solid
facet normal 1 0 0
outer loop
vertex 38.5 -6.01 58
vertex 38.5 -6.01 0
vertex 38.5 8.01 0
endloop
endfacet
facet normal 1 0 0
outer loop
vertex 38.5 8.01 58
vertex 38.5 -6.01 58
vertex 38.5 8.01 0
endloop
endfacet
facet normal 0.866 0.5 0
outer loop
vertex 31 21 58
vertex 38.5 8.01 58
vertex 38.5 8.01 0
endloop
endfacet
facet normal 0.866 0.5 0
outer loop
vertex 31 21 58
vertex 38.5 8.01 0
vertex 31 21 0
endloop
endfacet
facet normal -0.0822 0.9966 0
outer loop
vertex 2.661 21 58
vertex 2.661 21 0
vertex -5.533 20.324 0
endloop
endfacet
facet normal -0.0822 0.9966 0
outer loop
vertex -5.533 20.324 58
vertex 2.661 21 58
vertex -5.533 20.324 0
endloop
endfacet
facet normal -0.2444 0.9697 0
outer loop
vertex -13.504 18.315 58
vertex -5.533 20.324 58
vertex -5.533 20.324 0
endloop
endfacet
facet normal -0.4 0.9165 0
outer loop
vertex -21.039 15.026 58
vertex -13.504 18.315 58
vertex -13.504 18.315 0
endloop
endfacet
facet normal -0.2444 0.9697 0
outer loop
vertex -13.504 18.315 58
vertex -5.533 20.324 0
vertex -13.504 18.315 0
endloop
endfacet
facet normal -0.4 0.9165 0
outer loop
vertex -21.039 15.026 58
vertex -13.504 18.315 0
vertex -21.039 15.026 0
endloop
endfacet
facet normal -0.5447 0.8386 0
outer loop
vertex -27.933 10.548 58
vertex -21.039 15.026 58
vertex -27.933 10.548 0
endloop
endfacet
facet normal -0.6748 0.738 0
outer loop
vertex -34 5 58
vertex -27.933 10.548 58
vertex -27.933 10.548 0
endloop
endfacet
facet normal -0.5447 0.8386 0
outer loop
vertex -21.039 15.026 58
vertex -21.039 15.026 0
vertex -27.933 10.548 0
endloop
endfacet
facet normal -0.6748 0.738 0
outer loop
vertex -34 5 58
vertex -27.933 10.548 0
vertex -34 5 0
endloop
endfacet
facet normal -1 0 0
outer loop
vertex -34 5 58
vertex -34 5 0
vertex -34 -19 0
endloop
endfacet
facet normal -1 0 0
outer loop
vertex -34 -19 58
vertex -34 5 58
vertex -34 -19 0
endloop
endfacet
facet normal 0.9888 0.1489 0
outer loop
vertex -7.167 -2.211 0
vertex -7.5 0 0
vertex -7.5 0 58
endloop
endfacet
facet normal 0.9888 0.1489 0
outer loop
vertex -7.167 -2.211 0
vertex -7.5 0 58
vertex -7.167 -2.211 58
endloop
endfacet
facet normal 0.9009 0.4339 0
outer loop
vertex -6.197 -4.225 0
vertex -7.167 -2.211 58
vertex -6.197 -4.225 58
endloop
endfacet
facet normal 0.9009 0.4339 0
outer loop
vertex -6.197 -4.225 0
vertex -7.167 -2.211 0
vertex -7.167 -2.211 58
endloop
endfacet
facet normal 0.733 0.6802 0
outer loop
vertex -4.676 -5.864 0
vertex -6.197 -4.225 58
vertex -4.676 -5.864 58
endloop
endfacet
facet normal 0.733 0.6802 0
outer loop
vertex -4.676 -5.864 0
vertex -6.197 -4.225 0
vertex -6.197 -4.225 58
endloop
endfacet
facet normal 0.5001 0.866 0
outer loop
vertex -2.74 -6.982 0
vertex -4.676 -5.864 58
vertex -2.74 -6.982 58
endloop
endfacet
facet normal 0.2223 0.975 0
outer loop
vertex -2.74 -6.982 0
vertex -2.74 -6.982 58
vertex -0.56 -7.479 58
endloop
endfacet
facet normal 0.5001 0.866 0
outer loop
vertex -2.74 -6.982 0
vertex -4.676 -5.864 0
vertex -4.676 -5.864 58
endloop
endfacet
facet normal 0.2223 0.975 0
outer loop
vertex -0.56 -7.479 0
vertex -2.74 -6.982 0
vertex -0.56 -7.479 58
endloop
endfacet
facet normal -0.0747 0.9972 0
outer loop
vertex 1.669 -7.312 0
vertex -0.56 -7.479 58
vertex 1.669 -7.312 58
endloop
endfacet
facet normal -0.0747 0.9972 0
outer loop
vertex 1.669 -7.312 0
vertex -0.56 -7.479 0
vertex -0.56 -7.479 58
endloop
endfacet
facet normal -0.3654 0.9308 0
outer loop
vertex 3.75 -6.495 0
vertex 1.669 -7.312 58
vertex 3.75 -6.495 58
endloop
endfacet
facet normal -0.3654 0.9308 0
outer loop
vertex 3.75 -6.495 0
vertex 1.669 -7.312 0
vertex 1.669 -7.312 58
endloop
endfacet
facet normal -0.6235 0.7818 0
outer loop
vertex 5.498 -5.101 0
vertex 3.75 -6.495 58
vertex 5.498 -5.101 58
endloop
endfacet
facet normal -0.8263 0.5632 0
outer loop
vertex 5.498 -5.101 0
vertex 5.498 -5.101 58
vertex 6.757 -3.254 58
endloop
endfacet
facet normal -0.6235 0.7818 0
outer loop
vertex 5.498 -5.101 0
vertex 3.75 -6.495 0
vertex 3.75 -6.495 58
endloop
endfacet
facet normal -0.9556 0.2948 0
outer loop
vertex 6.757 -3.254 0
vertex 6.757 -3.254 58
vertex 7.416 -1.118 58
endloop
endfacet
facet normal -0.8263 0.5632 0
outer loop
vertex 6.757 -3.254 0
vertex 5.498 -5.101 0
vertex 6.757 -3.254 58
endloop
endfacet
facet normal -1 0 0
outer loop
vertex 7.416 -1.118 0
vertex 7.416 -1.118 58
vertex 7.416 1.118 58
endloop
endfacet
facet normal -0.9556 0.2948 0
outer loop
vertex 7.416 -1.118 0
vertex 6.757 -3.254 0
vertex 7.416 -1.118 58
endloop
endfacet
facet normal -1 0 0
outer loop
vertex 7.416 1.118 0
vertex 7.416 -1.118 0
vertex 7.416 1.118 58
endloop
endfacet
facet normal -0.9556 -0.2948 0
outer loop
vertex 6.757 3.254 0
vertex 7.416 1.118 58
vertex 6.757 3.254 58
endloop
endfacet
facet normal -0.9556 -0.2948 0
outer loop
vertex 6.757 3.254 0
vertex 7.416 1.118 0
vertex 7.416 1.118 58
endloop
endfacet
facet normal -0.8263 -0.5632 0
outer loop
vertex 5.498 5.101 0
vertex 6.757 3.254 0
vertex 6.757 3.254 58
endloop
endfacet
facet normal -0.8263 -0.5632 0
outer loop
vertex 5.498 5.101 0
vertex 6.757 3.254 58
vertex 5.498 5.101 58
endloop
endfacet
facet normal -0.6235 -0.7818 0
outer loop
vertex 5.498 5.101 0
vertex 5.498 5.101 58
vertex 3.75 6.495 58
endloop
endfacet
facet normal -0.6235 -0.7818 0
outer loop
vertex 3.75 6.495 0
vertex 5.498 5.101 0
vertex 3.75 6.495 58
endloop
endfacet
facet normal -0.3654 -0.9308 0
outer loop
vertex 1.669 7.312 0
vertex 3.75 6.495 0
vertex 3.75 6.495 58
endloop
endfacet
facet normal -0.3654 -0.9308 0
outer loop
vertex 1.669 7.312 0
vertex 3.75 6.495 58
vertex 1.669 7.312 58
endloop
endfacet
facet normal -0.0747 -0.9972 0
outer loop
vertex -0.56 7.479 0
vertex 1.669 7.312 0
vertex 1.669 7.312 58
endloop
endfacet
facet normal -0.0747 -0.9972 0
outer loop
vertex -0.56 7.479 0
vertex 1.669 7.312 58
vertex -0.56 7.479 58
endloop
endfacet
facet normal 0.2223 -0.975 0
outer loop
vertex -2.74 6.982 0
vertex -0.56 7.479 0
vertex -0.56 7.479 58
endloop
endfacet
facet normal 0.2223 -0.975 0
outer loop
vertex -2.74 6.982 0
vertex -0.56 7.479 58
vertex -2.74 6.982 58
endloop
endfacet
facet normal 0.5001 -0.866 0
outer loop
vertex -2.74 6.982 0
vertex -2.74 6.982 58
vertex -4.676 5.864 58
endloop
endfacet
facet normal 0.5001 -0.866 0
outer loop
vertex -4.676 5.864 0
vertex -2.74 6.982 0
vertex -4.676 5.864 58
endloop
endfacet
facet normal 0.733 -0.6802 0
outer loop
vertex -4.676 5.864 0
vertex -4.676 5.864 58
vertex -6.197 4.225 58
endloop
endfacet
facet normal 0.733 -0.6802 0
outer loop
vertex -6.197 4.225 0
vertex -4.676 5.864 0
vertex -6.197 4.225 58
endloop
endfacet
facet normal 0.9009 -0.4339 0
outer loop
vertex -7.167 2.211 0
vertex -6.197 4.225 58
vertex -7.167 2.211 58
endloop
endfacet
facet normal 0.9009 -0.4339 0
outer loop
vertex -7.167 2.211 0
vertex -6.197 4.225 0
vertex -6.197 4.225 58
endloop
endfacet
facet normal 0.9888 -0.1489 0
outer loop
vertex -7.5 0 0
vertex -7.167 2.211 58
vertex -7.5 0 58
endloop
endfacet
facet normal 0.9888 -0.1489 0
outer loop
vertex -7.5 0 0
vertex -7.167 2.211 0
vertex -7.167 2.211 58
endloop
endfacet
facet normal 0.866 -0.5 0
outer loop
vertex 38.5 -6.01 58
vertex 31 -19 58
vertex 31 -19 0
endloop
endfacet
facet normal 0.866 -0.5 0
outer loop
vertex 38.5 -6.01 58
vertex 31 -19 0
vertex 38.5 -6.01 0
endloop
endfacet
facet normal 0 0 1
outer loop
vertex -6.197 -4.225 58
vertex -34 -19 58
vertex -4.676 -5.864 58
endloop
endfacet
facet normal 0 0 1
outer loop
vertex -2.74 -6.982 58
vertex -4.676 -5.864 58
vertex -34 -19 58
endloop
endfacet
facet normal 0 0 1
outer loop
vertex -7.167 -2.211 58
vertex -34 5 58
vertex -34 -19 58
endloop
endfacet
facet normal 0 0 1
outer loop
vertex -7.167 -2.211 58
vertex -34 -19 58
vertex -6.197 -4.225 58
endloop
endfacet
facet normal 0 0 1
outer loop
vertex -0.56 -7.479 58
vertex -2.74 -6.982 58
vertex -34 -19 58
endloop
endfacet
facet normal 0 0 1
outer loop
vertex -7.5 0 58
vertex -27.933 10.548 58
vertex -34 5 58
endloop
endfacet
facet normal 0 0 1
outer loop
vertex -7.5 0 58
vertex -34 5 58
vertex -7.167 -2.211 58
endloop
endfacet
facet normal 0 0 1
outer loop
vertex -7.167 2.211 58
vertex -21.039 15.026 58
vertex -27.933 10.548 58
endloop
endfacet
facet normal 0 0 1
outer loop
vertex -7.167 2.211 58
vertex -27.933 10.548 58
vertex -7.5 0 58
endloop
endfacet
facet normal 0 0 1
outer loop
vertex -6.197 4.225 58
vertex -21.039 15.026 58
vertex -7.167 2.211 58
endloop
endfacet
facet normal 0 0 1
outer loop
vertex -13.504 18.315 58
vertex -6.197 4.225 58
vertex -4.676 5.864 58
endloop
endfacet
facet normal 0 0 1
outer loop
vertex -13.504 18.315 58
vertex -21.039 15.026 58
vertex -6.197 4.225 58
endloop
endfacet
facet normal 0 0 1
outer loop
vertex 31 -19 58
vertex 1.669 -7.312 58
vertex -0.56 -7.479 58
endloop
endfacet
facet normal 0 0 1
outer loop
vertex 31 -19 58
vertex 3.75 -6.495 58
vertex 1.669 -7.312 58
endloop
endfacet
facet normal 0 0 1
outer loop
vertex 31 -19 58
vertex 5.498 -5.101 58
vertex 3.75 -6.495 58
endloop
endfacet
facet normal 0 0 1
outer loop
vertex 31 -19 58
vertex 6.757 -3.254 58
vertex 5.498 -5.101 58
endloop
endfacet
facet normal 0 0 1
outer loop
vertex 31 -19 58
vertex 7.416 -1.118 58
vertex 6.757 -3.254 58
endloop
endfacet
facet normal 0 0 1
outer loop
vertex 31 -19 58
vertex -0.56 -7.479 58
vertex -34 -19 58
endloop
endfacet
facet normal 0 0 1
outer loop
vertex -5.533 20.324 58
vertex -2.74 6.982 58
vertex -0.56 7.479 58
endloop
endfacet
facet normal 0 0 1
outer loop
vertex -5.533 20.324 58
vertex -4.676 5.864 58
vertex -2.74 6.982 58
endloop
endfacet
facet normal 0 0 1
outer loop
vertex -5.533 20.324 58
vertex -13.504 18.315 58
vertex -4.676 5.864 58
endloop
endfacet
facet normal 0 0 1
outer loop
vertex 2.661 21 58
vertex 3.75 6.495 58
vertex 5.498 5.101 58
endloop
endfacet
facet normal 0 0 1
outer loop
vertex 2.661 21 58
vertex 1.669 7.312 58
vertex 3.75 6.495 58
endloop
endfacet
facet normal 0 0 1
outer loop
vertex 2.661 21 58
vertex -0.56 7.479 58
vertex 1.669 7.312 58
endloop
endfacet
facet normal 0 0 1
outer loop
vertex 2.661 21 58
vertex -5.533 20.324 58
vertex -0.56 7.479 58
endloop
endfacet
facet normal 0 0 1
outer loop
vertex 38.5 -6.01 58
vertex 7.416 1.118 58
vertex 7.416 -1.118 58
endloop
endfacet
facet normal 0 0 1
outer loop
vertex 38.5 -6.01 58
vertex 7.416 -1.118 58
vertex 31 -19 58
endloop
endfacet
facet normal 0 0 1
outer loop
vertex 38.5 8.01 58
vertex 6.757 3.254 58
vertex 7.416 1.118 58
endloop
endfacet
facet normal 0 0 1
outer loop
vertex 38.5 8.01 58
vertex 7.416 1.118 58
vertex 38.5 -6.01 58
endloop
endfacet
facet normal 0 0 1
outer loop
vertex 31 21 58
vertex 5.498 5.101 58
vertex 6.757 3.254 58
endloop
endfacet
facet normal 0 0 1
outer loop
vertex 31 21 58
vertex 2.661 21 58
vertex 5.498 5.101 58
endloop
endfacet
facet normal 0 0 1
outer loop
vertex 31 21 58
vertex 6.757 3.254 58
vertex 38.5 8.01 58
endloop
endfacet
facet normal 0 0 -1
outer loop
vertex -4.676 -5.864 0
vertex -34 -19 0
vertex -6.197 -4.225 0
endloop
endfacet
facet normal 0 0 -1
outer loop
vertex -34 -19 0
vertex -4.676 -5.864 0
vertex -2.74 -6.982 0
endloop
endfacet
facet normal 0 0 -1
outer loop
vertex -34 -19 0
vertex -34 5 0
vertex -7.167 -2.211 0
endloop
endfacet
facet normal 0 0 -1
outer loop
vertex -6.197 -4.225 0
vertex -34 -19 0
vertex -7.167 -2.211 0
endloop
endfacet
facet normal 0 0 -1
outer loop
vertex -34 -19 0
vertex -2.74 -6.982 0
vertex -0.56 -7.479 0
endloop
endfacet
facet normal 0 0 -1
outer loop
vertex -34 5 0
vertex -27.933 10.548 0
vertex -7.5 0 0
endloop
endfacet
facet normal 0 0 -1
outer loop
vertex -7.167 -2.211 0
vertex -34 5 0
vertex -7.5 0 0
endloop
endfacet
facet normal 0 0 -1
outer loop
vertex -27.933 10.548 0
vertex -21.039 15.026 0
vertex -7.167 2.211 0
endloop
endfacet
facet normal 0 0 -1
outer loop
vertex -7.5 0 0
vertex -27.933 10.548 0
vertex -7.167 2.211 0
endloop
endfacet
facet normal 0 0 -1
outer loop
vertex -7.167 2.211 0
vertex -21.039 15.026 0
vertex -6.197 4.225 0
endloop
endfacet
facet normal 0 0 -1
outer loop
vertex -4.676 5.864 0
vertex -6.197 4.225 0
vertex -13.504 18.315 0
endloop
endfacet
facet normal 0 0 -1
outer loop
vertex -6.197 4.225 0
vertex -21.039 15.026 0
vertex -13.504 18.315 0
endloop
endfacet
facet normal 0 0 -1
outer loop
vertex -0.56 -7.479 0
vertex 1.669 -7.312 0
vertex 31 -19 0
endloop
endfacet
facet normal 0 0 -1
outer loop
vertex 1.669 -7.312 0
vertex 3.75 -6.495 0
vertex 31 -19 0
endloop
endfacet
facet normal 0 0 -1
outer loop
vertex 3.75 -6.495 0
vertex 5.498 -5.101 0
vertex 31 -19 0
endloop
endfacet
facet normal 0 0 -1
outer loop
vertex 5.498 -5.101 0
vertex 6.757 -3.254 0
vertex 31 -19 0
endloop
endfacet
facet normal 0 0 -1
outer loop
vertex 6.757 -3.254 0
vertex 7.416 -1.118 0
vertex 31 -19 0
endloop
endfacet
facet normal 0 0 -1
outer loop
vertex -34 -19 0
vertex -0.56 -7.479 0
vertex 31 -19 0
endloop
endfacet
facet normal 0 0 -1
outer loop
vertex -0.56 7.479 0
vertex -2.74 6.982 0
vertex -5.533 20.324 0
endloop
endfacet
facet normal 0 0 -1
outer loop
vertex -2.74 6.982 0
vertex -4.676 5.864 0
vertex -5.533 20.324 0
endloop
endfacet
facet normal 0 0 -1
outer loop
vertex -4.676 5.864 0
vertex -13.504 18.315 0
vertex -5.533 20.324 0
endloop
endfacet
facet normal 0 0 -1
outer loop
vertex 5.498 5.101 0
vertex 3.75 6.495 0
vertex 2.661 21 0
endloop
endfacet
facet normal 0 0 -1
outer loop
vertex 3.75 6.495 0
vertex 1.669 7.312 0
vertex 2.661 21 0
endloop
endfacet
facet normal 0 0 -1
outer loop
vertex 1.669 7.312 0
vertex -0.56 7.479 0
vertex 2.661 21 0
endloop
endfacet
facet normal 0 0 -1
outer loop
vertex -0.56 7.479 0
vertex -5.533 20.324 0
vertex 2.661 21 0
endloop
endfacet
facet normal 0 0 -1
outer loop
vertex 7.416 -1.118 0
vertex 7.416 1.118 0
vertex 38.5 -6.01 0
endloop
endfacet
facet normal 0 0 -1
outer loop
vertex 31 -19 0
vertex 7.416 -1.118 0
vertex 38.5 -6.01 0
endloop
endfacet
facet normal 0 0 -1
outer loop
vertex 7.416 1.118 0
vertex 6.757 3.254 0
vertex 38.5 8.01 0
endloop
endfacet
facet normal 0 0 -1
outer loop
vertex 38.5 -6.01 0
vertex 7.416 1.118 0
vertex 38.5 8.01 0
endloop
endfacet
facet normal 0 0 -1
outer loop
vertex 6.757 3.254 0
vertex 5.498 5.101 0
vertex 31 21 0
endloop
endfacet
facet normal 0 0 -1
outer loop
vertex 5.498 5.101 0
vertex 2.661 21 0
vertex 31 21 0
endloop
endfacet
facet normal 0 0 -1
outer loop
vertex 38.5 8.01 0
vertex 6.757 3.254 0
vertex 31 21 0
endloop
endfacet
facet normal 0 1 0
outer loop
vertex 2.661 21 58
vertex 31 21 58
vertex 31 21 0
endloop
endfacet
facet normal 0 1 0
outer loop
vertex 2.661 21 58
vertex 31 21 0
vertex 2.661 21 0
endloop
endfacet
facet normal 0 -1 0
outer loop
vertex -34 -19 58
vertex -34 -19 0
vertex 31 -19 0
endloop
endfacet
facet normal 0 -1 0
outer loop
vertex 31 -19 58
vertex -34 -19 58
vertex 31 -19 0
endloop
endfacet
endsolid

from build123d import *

# Parameters (mm, degrees)
SKETCH1_R           = 7.5
BOSS_EXTRUDE2_DEPTH = 58


with BuildPart() as part:
    # Sketch1 → Boss-Extrude2 (new body)
    with BuildSketch(Plane.XY):
        with BuildLine():
            Line((-34, 5), (-34, -19))
            Line((-34, -19), (31, -19))
            Line((31, -19), (38.5, -6.009618943))
            Line((38.5, -6.009618943), (38.5, 8.009618943))
            Line((38.5, 8.009618943), (31, 21))
            Line((31, 21), (2.66060556, 21))
            ThreePointArc((2.66060556, 21), (-17.33939444, 16.82575695), (-34, 5))
        make_face()
        with Locations(Location((0, 0, 0), (0, 0, 180))):
            Circle(SKETCH1_R, mode=Mode.SUBTRACT)
    extrude(amount=BOSS_EXTRUDE2_DEPTH)


solid = part.part
